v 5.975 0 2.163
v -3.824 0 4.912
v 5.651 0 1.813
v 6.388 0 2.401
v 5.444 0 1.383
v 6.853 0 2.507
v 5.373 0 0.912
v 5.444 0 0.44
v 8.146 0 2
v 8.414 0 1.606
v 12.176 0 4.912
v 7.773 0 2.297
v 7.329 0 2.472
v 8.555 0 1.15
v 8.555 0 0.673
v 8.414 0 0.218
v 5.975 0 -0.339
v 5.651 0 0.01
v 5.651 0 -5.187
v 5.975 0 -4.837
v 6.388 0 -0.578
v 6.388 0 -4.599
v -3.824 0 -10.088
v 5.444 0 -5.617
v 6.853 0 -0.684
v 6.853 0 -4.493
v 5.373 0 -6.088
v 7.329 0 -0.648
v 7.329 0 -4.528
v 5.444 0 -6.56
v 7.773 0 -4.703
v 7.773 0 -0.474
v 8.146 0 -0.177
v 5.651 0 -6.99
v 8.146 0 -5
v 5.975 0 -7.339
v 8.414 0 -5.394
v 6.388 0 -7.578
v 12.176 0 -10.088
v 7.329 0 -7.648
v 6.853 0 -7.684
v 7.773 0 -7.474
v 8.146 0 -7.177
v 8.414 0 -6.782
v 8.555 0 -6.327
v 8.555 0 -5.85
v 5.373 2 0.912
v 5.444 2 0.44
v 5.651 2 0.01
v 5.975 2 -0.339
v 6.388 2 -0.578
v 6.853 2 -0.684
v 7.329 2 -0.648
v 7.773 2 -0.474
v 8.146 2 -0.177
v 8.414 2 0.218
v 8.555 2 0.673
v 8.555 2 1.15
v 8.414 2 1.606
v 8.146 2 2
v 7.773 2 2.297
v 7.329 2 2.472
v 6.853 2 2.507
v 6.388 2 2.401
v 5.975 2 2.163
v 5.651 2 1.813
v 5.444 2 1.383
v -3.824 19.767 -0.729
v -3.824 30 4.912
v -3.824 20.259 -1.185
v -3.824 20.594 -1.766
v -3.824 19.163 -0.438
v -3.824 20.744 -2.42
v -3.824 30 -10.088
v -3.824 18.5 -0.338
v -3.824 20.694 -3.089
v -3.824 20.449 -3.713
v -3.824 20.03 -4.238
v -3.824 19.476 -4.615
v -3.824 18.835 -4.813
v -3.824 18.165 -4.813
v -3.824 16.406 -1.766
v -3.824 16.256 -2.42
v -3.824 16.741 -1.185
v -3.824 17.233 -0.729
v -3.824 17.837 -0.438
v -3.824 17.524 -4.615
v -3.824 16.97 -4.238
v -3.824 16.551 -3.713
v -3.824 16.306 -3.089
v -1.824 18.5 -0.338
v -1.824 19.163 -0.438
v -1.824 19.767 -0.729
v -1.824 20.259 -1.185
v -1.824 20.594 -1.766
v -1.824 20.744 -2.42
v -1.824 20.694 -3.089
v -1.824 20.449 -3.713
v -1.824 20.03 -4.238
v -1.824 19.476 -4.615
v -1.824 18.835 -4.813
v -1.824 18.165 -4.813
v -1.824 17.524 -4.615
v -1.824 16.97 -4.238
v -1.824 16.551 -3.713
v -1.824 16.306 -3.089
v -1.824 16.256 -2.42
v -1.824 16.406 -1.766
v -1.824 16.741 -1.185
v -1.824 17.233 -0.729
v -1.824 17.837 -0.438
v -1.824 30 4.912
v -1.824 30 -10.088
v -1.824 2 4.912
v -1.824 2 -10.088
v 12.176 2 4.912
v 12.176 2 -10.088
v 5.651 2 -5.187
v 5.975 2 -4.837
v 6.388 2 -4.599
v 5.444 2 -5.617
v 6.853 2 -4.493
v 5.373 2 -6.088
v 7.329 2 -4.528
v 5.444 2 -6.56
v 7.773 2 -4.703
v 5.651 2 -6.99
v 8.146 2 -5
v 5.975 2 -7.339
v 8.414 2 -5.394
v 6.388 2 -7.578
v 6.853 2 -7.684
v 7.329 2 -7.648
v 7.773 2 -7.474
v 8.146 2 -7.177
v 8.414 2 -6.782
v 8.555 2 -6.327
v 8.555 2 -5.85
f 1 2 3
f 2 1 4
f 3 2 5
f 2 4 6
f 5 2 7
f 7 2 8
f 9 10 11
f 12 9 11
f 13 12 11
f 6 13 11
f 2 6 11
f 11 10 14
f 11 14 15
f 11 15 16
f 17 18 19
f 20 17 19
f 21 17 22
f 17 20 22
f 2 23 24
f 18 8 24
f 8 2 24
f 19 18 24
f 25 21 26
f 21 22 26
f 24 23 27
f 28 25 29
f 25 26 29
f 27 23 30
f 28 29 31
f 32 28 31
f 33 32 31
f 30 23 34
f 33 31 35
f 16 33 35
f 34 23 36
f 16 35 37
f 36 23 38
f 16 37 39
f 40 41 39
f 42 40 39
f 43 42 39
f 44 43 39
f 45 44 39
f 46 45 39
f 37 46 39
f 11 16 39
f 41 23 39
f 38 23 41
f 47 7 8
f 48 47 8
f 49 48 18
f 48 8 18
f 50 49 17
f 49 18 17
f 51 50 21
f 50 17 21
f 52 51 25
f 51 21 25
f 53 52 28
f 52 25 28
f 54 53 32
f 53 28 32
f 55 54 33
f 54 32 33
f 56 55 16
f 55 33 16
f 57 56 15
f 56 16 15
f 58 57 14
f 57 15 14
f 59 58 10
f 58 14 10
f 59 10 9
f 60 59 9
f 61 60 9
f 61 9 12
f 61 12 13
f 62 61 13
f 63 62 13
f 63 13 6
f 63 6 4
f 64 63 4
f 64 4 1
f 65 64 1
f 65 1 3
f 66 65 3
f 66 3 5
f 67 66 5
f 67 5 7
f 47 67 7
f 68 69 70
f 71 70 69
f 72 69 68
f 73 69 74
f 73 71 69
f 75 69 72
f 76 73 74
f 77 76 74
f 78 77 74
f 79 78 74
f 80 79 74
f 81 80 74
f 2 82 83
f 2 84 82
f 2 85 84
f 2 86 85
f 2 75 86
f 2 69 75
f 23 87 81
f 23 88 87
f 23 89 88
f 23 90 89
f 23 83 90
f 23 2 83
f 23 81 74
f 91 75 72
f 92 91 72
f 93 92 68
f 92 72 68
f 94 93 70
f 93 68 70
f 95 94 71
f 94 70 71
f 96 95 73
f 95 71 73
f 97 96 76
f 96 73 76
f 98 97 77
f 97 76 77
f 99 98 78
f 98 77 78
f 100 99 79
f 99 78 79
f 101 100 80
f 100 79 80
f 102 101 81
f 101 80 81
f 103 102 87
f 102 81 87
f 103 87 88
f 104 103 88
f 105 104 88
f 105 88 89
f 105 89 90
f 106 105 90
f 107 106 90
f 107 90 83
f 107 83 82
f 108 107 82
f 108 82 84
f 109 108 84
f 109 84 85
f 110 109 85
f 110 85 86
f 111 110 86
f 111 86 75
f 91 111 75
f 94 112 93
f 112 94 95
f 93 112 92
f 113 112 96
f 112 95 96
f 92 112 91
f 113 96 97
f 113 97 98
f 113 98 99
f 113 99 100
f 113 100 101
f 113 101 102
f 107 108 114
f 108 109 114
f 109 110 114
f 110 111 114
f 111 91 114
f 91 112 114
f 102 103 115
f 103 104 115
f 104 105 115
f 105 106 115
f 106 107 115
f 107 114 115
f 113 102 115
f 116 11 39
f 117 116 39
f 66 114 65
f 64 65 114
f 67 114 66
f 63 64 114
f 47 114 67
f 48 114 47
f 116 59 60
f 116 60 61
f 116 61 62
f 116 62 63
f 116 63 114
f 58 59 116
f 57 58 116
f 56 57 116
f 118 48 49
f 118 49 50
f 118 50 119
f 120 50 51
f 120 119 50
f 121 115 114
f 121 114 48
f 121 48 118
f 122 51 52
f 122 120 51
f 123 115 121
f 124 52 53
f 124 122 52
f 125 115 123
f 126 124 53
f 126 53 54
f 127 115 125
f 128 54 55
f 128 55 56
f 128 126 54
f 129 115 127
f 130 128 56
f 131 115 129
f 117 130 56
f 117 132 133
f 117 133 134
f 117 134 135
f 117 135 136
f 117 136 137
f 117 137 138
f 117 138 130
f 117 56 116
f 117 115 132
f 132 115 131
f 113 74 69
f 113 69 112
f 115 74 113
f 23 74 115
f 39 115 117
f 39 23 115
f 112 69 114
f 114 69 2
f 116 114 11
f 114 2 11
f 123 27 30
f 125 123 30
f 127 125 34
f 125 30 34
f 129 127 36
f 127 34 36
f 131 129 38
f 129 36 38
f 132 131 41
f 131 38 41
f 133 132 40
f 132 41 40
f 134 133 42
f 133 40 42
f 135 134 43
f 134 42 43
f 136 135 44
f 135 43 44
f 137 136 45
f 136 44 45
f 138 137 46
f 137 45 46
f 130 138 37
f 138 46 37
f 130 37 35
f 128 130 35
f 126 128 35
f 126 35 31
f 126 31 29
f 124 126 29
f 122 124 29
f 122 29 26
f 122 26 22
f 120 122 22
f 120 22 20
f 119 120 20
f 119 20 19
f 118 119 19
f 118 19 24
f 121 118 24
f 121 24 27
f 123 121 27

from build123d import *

# Parameters (mm, degrees)
SKETCH1_W                  = 16
SKETCH1_H                  = 15
BOSS_EXTRUDE1_DEPTH        = 2
SKETCH4_W                  = 2
SKETCH4_H                  = 15
BOSS_EXTRUDE4_DEPTH        = 28
F_3_2_3_2_DIAMETER_SLOT1_D = 3.2
M4_CLEARANCE_SLOT1_D       = 4.5


with BuildPart() as part:
    # Sketch1 → Boss-Extrude1 (new body)
    with BuildSketch(Plane(origin=(0, 0, 0), x_dir=(1, 0, 0), z_dir=(0, 1, 0))):
        with Locations((4.176470588, 2.588235294)):
            Rectangle(SKETCH1_W, SKETCH1_H)
    extrude(amount=BOSS_EXTRUDE1_DEPTH)

    # Sketch4 → Boss-Extrude4 (add)
    with BuildSketch(Plane(origin=(0, 2, 0), x_dir=(1, 0, 0), z_dir=(0, 1, 0))):
        with Locations((-2.823529412, 2.588235294)):
            Rectangle(SKETCH4_W, SKETCH4_H)
    extrude(amount=BOSS_EXTRUDE4_DEPTH)

    # Ø3.2 (3.2) Diameter Slot1 (through all)
    with Locations(Plane(origin=(0, 2, 0), x_dir=(1, 0, 0), z_dir=(0, 1, 0))):
        with Locations((6.972823148, 6.088235294), (6.972823148, -0.911764706)):
            Hole(F_3_2_3_2_DIAMETER_SLOT1_D / 2)

    # M4 Clearance Slot1 (through all)
    with Locations(Plane(origin=(-1.823529412, 0, 0), x_dir=(0, 0, -1), z_dir=(1, 0, 0))):
        with Locations((2.588235294, 18.5)):
            Hole(M4_CLEARANCE_SLOT1_D / 2)


solid = part.part
